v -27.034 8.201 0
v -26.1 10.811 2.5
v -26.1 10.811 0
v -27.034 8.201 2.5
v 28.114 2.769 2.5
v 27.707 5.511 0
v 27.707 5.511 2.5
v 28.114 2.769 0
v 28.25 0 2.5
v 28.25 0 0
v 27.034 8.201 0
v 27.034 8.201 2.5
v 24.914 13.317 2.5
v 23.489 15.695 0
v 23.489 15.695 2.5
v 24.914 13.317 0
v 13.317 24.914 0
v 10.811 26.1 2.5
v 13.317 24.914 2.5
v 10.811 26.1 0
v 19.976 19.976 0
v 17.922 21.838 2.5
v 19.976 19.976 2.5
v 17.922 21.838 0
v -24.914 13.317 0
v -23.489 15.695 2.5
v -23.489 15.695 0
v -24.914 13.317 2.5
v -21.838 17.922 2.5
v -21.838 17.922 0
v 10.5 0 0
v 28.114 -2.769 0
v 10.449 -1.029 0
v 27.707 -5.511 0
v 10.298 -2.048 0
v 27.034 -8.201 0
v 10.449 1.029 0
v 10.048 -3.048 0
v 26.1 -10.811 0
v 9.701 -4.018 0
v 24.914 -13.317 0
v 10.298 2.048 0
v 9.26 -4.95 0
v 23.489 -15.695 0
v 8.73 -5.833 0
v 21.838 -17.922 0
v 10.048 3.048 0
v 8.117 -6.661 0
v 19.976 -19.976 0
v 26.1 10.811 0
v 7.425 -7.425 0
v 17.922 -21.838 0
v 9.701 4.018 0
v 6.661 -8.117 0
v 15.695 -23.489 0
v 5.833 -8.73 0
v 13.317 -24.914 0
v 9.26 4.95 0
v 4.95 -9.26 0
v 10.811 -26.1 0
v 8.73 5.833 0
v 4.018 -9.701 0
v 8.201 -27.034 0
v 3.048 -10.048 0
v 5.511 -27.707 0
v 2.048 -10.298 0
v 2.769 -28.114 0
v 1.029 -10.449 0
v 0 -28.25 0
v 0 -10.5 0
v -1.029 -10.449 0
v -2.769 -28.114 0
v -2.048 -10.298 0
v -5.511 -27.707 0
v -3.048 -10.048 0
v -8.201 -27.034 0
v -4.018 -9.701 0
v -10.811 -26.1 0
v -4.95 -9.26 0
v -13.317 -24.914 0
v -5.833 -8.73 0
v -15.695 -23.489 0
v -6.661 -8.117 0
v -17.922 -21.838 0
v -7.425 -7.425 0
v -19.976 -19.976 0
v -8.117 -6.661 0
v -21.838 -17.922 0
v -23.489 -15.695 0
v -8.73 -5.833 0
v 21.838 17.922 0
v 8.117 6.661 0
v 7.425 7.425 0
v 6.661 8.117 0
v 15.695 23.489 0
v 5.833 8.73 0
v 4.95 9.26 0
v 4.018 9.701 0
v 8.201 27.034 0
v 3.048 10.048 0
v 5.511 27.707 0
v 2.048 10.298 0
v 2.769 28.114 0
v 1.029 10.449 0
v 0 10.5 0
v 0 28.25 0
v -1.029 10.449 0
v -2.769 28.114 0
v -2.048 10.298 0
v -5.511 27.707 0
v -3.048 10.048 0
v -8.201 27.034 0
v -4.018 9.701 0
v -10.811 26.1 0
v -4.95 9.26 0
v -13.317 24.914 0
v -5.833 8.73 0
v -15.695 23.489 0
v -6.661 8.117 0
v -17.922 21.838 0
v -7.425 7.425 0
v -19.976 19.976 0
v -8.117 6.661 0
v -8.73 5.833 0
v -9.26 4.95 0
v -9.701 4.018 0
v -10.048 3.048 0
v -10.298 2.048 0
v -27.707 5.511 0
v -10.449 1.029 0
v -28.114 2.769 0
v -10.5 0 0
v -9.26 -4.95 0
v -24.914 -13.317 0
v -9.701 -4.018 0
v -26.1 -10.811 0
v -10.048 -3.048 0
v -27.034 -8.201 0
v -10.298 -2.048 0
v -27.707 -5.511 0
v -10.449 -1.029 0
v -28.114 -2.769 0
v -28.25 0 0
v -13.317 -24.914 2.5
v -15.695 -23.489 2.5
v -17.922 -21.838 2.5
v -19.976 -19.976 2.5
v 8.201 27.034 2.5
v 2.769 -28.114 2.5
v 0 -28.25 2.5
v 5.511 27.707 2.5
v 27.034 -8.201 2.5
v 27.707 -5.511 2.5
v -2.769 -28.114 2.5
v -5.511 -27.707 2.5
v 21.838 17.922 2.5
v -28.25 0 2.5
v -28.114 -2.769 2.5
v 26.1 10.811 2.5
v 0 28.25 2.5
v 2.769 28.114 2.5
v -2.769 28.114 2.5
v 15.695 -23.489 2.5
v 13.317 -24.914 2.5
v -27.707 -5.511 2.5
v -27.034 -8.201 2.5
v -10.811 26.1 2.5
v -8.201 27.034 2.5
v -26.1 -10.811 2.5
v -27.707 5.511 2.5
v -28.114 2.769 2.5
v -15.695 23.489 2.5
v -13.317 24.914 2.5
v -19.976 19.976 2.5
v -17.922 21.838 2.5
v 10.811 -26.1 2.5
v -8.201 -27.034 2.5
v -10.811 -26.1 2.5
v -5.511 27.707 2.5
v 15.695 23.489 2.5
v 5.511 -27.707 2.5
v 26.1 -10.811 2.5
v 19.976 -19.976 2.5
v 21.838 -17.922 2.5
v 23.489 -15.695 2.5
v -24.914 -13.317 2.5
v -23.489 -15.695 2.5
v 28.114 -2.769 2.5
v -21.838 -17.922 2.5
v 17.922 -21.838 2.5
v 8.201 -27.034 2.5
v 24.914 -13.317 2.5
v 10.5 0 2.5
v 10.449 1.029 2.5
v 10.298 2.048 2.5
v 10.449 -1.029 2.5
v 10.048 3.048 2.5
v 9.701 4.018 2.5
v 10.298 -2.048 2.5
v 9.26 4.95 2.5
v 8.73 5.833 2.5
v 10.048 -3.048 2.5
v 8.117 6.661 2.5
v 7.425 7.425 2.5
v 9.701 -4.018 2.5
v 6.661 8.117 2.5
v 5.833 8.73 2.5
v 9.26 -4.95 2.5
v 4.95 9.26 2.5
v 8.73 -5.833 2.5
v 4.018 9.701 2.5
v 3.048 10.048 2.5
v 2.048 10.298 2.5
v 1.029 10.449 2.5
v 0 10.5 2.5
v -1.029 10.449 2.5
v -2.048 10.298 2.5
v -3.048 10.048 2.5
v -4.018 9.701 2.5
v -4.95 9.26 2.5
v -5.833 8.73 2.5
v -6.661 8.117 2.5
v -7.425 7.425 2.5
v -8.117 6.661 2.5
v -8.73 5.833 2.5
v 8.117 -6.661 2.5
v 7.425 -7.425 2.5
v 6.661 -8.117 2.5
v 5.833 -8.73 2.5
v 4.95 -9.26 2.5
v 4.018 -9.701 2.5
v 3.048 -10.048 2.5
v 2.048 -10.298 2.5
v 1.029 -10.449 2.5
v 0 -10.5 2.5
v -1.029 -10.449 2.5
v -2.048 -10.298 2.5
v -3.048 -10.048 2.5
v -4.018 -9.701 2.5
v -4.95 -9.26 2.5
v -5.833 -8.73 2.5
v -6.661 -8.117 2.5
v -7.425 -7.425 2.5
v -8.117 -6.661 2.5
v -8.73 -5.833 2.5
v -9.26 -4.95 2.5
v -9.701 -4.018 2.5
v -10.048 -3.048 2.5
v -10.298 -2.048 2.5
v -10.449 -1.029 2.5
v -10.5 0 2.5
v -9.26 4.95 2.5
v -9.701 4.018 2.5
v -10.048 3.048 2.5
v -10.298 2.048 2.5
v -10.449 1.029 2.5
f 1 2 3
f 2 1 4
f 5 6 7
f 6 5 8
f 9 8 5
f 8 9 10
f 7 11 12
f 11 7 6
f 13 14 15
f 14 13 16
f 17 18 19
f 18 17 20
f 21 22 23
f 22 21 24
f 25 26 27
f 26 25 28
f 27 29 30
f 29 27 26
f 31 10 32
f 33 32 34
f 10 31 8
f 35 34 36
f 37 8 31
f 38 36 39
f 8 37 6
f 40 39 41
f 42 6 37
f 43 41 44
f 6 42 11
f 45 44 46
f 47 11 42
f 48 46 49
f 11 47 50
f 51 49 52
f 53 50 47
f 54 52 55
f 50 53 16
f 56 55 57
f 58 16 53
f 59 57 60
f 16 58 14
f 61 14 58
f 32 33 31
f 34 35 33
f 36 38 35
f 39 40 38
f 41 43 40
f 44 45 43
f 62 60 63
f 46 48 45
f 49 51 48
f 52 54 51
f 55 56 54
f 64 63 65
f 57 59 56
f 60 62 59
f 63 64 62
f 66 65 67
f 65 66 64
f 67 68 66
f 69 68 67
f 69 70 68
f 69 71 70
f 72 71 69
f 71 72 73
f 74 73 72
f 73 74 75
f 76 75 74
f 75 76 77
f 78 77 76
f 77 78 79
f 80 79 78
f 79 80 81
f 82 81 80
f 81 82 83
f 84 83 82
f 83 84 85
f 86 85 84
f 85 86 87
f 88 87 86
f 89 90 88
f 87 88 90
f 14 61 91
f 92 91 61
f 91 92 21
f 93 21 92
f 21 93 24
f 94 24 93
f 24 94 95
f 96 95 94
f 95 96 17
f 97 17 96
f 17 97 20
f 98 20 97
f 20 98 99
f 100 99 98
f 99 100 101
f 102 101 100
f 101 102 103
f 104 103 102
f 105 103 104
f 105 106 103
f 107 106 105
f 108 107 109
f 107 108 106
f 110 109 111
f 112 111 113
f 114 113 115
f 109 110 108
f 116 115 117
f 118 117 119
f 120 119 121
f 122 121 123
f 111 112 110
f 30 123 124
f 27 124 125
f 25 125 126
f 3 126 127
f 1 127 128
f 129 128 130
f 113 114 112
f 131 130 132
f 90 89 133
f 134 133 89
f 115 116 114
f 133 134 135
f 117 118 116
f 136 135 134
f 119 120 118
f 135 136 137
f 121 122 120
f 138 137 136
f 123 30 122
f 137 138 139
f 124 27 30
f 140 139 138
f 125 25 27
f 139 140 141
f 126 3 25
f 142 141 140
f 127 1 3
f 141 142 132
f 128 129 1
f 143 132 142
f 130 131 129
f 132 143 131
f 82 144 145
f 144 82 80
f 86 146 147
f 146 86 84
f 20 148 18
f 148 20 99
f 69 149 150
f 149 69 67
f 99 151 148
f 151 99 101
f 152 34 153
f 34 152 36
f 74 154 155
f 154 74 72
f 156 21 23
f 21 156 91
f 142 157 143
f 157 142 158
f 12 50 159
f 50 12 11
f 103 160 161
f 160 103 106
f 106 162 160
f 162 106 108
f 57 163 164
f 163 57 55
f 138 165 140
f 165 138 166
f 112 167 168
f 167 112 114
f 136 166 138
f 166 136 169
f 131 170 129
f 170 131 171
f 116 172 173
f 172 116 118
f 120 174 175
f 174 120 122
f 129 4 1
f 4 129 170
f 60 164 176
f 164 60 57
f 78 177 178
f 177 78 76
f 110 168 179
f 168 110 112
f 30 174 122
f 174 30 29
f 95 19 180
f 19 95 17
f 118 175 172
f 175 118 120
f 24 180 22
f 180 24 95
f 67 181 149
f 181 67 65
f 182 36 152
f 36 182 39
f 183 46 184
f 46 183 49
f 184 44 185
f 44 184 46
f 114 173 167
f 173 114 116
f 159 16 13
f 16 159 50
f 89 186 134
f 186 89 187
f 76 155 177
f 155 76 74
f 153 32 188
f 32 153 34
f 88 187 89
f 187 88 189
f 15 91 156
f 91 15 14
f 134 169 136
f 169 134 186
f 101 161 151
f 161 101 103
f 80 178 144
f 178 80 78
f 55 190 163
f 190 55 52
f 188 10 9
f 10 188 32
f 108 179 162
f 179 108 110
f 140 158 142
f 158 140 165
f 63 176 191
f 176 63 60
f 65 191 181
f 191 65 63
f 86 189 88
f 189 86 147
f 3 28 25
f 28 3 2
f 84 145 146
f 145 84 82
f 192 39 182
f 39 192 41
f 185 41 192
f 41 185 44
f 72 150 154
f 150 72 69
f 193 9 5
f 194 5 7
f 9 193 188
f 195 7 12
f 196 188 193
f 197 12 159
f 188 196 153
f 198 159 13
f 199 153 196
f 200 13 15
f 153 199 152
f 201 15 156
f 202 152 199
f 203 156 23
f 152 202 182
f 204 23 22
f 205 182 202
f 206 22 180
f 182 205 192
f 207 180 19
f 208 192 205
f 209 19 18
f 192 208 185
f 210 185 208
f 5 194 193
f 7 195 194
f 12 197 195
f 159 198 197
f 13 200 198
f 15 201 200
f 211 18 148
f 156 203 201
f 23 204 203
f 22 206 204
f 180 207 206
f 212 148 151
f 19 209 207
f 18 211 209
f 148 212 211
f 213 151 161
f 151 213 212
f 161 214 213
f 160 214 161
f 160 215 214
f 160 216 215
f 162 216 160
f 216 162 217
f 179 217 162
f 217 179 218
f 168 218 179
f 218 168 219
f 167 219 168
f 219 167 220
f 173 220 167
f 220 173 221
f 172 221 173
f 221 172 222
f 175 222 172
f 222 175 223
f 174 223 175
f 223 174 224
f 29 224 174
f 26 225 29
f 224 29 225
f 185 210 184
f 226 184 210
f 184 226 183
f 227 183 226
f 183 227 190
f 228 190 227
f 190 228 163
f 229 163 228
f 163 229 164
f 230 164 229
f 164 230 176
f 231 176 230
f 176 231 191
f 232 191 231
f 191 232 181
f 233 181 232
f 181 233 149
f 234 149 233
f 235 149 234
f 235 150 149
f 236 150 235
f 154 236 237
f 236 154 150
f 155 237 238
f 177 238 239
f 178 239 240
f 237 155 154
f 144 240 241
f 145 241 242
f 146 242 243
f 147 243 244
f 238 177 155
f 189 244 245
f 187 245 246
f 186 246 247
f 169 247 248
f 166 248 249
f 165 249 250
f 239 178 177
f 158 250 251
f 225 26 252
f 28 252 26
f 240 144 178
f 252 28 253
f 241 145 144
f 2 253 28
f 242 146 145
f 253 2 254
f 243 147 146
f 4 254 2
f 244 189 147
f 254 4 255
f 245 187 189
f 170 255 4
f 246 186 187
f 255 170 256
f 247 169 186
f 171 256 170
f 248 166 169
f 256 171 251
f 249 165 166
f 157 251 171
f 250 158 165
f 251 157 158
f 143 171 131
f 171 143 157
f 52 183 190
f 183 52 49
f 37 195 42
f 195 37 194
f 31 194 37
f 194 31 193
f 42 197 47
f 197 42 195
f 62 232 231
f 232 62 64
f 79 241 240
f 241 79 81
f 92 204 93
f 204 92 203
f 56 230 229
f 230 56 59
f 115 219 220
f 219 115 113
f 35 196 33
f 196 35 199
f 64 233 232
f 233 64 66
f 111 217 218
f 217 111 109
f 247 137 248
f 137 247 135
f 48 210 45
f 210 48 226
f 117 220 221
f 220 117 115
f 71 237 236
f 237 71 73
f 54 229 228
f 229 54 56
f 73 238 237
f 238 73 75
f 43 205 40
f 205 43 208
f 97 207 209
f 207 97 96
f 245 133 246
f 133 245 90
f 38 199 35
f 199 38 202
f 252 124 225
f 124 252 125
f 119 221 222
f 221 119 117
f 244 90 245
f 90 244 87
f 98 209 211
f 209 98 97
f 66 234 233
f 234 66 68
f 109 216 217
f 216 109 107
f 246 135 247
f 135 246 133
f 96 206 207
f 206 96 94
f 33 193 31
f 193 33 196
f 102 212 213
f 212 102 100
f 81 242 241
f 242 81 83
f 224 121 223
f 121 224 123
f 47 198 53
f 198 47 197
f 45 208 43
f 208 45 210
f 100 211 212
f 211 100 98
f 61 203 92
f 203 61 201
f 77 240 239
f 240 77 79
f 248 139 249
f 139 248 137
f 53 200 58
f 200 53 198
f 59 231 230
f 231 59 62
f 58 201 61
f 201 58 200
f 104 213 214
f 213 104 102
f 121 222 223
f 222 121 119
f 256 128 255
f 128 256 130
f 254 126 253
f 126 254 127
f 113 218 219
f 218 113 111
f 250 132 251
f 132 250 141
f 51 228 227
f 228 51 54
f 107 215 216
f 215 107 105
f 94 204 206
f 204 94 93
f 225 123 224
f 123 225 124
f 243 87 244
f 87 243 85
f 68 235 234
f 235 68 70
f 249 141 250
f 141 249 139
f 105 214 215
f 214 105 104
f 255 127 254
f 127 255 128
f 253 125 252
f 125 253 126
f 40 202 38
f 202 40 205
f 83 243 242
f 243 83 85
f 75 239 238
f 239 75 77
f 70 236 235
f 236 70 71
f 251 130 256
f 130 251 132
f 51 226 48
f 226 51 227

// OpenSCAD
// vim:ts=4:sw=4:sts=4:et:ai

$fn=64;

module circletext(mytext,textsize=20,myfont="Arial",radius=100,thickness=1,degrees=360,top=true) {
    chars=len(mytext)+1;
    for (i = [1:chars]) {
    rotate([0,0,(top?1:-1)*(degrees/2-i*(degrees/chars))])
        translate([0,(top?1:-1)*radius-(top?0:textsize/2),0])
            //linear_extrude(thickness)
                text(mytext[i-1],halign="center",font=myfont,size=textsize);
    }
}

height = 2.5;
inner_d = 20;
outer_d = 57.5;
kuttekant = 0.5;

difference() {
    cylinder(h=height,d=outer_d-kuttekant*2);
    cylinder(h=height,d=inner_d+kuttekant*2);
}

//circletext("My text goes here",textsize=20,degrees=160,top=true);
//circletext("Text can be underneath as well",textsize=15,degrees=180,top=false);
